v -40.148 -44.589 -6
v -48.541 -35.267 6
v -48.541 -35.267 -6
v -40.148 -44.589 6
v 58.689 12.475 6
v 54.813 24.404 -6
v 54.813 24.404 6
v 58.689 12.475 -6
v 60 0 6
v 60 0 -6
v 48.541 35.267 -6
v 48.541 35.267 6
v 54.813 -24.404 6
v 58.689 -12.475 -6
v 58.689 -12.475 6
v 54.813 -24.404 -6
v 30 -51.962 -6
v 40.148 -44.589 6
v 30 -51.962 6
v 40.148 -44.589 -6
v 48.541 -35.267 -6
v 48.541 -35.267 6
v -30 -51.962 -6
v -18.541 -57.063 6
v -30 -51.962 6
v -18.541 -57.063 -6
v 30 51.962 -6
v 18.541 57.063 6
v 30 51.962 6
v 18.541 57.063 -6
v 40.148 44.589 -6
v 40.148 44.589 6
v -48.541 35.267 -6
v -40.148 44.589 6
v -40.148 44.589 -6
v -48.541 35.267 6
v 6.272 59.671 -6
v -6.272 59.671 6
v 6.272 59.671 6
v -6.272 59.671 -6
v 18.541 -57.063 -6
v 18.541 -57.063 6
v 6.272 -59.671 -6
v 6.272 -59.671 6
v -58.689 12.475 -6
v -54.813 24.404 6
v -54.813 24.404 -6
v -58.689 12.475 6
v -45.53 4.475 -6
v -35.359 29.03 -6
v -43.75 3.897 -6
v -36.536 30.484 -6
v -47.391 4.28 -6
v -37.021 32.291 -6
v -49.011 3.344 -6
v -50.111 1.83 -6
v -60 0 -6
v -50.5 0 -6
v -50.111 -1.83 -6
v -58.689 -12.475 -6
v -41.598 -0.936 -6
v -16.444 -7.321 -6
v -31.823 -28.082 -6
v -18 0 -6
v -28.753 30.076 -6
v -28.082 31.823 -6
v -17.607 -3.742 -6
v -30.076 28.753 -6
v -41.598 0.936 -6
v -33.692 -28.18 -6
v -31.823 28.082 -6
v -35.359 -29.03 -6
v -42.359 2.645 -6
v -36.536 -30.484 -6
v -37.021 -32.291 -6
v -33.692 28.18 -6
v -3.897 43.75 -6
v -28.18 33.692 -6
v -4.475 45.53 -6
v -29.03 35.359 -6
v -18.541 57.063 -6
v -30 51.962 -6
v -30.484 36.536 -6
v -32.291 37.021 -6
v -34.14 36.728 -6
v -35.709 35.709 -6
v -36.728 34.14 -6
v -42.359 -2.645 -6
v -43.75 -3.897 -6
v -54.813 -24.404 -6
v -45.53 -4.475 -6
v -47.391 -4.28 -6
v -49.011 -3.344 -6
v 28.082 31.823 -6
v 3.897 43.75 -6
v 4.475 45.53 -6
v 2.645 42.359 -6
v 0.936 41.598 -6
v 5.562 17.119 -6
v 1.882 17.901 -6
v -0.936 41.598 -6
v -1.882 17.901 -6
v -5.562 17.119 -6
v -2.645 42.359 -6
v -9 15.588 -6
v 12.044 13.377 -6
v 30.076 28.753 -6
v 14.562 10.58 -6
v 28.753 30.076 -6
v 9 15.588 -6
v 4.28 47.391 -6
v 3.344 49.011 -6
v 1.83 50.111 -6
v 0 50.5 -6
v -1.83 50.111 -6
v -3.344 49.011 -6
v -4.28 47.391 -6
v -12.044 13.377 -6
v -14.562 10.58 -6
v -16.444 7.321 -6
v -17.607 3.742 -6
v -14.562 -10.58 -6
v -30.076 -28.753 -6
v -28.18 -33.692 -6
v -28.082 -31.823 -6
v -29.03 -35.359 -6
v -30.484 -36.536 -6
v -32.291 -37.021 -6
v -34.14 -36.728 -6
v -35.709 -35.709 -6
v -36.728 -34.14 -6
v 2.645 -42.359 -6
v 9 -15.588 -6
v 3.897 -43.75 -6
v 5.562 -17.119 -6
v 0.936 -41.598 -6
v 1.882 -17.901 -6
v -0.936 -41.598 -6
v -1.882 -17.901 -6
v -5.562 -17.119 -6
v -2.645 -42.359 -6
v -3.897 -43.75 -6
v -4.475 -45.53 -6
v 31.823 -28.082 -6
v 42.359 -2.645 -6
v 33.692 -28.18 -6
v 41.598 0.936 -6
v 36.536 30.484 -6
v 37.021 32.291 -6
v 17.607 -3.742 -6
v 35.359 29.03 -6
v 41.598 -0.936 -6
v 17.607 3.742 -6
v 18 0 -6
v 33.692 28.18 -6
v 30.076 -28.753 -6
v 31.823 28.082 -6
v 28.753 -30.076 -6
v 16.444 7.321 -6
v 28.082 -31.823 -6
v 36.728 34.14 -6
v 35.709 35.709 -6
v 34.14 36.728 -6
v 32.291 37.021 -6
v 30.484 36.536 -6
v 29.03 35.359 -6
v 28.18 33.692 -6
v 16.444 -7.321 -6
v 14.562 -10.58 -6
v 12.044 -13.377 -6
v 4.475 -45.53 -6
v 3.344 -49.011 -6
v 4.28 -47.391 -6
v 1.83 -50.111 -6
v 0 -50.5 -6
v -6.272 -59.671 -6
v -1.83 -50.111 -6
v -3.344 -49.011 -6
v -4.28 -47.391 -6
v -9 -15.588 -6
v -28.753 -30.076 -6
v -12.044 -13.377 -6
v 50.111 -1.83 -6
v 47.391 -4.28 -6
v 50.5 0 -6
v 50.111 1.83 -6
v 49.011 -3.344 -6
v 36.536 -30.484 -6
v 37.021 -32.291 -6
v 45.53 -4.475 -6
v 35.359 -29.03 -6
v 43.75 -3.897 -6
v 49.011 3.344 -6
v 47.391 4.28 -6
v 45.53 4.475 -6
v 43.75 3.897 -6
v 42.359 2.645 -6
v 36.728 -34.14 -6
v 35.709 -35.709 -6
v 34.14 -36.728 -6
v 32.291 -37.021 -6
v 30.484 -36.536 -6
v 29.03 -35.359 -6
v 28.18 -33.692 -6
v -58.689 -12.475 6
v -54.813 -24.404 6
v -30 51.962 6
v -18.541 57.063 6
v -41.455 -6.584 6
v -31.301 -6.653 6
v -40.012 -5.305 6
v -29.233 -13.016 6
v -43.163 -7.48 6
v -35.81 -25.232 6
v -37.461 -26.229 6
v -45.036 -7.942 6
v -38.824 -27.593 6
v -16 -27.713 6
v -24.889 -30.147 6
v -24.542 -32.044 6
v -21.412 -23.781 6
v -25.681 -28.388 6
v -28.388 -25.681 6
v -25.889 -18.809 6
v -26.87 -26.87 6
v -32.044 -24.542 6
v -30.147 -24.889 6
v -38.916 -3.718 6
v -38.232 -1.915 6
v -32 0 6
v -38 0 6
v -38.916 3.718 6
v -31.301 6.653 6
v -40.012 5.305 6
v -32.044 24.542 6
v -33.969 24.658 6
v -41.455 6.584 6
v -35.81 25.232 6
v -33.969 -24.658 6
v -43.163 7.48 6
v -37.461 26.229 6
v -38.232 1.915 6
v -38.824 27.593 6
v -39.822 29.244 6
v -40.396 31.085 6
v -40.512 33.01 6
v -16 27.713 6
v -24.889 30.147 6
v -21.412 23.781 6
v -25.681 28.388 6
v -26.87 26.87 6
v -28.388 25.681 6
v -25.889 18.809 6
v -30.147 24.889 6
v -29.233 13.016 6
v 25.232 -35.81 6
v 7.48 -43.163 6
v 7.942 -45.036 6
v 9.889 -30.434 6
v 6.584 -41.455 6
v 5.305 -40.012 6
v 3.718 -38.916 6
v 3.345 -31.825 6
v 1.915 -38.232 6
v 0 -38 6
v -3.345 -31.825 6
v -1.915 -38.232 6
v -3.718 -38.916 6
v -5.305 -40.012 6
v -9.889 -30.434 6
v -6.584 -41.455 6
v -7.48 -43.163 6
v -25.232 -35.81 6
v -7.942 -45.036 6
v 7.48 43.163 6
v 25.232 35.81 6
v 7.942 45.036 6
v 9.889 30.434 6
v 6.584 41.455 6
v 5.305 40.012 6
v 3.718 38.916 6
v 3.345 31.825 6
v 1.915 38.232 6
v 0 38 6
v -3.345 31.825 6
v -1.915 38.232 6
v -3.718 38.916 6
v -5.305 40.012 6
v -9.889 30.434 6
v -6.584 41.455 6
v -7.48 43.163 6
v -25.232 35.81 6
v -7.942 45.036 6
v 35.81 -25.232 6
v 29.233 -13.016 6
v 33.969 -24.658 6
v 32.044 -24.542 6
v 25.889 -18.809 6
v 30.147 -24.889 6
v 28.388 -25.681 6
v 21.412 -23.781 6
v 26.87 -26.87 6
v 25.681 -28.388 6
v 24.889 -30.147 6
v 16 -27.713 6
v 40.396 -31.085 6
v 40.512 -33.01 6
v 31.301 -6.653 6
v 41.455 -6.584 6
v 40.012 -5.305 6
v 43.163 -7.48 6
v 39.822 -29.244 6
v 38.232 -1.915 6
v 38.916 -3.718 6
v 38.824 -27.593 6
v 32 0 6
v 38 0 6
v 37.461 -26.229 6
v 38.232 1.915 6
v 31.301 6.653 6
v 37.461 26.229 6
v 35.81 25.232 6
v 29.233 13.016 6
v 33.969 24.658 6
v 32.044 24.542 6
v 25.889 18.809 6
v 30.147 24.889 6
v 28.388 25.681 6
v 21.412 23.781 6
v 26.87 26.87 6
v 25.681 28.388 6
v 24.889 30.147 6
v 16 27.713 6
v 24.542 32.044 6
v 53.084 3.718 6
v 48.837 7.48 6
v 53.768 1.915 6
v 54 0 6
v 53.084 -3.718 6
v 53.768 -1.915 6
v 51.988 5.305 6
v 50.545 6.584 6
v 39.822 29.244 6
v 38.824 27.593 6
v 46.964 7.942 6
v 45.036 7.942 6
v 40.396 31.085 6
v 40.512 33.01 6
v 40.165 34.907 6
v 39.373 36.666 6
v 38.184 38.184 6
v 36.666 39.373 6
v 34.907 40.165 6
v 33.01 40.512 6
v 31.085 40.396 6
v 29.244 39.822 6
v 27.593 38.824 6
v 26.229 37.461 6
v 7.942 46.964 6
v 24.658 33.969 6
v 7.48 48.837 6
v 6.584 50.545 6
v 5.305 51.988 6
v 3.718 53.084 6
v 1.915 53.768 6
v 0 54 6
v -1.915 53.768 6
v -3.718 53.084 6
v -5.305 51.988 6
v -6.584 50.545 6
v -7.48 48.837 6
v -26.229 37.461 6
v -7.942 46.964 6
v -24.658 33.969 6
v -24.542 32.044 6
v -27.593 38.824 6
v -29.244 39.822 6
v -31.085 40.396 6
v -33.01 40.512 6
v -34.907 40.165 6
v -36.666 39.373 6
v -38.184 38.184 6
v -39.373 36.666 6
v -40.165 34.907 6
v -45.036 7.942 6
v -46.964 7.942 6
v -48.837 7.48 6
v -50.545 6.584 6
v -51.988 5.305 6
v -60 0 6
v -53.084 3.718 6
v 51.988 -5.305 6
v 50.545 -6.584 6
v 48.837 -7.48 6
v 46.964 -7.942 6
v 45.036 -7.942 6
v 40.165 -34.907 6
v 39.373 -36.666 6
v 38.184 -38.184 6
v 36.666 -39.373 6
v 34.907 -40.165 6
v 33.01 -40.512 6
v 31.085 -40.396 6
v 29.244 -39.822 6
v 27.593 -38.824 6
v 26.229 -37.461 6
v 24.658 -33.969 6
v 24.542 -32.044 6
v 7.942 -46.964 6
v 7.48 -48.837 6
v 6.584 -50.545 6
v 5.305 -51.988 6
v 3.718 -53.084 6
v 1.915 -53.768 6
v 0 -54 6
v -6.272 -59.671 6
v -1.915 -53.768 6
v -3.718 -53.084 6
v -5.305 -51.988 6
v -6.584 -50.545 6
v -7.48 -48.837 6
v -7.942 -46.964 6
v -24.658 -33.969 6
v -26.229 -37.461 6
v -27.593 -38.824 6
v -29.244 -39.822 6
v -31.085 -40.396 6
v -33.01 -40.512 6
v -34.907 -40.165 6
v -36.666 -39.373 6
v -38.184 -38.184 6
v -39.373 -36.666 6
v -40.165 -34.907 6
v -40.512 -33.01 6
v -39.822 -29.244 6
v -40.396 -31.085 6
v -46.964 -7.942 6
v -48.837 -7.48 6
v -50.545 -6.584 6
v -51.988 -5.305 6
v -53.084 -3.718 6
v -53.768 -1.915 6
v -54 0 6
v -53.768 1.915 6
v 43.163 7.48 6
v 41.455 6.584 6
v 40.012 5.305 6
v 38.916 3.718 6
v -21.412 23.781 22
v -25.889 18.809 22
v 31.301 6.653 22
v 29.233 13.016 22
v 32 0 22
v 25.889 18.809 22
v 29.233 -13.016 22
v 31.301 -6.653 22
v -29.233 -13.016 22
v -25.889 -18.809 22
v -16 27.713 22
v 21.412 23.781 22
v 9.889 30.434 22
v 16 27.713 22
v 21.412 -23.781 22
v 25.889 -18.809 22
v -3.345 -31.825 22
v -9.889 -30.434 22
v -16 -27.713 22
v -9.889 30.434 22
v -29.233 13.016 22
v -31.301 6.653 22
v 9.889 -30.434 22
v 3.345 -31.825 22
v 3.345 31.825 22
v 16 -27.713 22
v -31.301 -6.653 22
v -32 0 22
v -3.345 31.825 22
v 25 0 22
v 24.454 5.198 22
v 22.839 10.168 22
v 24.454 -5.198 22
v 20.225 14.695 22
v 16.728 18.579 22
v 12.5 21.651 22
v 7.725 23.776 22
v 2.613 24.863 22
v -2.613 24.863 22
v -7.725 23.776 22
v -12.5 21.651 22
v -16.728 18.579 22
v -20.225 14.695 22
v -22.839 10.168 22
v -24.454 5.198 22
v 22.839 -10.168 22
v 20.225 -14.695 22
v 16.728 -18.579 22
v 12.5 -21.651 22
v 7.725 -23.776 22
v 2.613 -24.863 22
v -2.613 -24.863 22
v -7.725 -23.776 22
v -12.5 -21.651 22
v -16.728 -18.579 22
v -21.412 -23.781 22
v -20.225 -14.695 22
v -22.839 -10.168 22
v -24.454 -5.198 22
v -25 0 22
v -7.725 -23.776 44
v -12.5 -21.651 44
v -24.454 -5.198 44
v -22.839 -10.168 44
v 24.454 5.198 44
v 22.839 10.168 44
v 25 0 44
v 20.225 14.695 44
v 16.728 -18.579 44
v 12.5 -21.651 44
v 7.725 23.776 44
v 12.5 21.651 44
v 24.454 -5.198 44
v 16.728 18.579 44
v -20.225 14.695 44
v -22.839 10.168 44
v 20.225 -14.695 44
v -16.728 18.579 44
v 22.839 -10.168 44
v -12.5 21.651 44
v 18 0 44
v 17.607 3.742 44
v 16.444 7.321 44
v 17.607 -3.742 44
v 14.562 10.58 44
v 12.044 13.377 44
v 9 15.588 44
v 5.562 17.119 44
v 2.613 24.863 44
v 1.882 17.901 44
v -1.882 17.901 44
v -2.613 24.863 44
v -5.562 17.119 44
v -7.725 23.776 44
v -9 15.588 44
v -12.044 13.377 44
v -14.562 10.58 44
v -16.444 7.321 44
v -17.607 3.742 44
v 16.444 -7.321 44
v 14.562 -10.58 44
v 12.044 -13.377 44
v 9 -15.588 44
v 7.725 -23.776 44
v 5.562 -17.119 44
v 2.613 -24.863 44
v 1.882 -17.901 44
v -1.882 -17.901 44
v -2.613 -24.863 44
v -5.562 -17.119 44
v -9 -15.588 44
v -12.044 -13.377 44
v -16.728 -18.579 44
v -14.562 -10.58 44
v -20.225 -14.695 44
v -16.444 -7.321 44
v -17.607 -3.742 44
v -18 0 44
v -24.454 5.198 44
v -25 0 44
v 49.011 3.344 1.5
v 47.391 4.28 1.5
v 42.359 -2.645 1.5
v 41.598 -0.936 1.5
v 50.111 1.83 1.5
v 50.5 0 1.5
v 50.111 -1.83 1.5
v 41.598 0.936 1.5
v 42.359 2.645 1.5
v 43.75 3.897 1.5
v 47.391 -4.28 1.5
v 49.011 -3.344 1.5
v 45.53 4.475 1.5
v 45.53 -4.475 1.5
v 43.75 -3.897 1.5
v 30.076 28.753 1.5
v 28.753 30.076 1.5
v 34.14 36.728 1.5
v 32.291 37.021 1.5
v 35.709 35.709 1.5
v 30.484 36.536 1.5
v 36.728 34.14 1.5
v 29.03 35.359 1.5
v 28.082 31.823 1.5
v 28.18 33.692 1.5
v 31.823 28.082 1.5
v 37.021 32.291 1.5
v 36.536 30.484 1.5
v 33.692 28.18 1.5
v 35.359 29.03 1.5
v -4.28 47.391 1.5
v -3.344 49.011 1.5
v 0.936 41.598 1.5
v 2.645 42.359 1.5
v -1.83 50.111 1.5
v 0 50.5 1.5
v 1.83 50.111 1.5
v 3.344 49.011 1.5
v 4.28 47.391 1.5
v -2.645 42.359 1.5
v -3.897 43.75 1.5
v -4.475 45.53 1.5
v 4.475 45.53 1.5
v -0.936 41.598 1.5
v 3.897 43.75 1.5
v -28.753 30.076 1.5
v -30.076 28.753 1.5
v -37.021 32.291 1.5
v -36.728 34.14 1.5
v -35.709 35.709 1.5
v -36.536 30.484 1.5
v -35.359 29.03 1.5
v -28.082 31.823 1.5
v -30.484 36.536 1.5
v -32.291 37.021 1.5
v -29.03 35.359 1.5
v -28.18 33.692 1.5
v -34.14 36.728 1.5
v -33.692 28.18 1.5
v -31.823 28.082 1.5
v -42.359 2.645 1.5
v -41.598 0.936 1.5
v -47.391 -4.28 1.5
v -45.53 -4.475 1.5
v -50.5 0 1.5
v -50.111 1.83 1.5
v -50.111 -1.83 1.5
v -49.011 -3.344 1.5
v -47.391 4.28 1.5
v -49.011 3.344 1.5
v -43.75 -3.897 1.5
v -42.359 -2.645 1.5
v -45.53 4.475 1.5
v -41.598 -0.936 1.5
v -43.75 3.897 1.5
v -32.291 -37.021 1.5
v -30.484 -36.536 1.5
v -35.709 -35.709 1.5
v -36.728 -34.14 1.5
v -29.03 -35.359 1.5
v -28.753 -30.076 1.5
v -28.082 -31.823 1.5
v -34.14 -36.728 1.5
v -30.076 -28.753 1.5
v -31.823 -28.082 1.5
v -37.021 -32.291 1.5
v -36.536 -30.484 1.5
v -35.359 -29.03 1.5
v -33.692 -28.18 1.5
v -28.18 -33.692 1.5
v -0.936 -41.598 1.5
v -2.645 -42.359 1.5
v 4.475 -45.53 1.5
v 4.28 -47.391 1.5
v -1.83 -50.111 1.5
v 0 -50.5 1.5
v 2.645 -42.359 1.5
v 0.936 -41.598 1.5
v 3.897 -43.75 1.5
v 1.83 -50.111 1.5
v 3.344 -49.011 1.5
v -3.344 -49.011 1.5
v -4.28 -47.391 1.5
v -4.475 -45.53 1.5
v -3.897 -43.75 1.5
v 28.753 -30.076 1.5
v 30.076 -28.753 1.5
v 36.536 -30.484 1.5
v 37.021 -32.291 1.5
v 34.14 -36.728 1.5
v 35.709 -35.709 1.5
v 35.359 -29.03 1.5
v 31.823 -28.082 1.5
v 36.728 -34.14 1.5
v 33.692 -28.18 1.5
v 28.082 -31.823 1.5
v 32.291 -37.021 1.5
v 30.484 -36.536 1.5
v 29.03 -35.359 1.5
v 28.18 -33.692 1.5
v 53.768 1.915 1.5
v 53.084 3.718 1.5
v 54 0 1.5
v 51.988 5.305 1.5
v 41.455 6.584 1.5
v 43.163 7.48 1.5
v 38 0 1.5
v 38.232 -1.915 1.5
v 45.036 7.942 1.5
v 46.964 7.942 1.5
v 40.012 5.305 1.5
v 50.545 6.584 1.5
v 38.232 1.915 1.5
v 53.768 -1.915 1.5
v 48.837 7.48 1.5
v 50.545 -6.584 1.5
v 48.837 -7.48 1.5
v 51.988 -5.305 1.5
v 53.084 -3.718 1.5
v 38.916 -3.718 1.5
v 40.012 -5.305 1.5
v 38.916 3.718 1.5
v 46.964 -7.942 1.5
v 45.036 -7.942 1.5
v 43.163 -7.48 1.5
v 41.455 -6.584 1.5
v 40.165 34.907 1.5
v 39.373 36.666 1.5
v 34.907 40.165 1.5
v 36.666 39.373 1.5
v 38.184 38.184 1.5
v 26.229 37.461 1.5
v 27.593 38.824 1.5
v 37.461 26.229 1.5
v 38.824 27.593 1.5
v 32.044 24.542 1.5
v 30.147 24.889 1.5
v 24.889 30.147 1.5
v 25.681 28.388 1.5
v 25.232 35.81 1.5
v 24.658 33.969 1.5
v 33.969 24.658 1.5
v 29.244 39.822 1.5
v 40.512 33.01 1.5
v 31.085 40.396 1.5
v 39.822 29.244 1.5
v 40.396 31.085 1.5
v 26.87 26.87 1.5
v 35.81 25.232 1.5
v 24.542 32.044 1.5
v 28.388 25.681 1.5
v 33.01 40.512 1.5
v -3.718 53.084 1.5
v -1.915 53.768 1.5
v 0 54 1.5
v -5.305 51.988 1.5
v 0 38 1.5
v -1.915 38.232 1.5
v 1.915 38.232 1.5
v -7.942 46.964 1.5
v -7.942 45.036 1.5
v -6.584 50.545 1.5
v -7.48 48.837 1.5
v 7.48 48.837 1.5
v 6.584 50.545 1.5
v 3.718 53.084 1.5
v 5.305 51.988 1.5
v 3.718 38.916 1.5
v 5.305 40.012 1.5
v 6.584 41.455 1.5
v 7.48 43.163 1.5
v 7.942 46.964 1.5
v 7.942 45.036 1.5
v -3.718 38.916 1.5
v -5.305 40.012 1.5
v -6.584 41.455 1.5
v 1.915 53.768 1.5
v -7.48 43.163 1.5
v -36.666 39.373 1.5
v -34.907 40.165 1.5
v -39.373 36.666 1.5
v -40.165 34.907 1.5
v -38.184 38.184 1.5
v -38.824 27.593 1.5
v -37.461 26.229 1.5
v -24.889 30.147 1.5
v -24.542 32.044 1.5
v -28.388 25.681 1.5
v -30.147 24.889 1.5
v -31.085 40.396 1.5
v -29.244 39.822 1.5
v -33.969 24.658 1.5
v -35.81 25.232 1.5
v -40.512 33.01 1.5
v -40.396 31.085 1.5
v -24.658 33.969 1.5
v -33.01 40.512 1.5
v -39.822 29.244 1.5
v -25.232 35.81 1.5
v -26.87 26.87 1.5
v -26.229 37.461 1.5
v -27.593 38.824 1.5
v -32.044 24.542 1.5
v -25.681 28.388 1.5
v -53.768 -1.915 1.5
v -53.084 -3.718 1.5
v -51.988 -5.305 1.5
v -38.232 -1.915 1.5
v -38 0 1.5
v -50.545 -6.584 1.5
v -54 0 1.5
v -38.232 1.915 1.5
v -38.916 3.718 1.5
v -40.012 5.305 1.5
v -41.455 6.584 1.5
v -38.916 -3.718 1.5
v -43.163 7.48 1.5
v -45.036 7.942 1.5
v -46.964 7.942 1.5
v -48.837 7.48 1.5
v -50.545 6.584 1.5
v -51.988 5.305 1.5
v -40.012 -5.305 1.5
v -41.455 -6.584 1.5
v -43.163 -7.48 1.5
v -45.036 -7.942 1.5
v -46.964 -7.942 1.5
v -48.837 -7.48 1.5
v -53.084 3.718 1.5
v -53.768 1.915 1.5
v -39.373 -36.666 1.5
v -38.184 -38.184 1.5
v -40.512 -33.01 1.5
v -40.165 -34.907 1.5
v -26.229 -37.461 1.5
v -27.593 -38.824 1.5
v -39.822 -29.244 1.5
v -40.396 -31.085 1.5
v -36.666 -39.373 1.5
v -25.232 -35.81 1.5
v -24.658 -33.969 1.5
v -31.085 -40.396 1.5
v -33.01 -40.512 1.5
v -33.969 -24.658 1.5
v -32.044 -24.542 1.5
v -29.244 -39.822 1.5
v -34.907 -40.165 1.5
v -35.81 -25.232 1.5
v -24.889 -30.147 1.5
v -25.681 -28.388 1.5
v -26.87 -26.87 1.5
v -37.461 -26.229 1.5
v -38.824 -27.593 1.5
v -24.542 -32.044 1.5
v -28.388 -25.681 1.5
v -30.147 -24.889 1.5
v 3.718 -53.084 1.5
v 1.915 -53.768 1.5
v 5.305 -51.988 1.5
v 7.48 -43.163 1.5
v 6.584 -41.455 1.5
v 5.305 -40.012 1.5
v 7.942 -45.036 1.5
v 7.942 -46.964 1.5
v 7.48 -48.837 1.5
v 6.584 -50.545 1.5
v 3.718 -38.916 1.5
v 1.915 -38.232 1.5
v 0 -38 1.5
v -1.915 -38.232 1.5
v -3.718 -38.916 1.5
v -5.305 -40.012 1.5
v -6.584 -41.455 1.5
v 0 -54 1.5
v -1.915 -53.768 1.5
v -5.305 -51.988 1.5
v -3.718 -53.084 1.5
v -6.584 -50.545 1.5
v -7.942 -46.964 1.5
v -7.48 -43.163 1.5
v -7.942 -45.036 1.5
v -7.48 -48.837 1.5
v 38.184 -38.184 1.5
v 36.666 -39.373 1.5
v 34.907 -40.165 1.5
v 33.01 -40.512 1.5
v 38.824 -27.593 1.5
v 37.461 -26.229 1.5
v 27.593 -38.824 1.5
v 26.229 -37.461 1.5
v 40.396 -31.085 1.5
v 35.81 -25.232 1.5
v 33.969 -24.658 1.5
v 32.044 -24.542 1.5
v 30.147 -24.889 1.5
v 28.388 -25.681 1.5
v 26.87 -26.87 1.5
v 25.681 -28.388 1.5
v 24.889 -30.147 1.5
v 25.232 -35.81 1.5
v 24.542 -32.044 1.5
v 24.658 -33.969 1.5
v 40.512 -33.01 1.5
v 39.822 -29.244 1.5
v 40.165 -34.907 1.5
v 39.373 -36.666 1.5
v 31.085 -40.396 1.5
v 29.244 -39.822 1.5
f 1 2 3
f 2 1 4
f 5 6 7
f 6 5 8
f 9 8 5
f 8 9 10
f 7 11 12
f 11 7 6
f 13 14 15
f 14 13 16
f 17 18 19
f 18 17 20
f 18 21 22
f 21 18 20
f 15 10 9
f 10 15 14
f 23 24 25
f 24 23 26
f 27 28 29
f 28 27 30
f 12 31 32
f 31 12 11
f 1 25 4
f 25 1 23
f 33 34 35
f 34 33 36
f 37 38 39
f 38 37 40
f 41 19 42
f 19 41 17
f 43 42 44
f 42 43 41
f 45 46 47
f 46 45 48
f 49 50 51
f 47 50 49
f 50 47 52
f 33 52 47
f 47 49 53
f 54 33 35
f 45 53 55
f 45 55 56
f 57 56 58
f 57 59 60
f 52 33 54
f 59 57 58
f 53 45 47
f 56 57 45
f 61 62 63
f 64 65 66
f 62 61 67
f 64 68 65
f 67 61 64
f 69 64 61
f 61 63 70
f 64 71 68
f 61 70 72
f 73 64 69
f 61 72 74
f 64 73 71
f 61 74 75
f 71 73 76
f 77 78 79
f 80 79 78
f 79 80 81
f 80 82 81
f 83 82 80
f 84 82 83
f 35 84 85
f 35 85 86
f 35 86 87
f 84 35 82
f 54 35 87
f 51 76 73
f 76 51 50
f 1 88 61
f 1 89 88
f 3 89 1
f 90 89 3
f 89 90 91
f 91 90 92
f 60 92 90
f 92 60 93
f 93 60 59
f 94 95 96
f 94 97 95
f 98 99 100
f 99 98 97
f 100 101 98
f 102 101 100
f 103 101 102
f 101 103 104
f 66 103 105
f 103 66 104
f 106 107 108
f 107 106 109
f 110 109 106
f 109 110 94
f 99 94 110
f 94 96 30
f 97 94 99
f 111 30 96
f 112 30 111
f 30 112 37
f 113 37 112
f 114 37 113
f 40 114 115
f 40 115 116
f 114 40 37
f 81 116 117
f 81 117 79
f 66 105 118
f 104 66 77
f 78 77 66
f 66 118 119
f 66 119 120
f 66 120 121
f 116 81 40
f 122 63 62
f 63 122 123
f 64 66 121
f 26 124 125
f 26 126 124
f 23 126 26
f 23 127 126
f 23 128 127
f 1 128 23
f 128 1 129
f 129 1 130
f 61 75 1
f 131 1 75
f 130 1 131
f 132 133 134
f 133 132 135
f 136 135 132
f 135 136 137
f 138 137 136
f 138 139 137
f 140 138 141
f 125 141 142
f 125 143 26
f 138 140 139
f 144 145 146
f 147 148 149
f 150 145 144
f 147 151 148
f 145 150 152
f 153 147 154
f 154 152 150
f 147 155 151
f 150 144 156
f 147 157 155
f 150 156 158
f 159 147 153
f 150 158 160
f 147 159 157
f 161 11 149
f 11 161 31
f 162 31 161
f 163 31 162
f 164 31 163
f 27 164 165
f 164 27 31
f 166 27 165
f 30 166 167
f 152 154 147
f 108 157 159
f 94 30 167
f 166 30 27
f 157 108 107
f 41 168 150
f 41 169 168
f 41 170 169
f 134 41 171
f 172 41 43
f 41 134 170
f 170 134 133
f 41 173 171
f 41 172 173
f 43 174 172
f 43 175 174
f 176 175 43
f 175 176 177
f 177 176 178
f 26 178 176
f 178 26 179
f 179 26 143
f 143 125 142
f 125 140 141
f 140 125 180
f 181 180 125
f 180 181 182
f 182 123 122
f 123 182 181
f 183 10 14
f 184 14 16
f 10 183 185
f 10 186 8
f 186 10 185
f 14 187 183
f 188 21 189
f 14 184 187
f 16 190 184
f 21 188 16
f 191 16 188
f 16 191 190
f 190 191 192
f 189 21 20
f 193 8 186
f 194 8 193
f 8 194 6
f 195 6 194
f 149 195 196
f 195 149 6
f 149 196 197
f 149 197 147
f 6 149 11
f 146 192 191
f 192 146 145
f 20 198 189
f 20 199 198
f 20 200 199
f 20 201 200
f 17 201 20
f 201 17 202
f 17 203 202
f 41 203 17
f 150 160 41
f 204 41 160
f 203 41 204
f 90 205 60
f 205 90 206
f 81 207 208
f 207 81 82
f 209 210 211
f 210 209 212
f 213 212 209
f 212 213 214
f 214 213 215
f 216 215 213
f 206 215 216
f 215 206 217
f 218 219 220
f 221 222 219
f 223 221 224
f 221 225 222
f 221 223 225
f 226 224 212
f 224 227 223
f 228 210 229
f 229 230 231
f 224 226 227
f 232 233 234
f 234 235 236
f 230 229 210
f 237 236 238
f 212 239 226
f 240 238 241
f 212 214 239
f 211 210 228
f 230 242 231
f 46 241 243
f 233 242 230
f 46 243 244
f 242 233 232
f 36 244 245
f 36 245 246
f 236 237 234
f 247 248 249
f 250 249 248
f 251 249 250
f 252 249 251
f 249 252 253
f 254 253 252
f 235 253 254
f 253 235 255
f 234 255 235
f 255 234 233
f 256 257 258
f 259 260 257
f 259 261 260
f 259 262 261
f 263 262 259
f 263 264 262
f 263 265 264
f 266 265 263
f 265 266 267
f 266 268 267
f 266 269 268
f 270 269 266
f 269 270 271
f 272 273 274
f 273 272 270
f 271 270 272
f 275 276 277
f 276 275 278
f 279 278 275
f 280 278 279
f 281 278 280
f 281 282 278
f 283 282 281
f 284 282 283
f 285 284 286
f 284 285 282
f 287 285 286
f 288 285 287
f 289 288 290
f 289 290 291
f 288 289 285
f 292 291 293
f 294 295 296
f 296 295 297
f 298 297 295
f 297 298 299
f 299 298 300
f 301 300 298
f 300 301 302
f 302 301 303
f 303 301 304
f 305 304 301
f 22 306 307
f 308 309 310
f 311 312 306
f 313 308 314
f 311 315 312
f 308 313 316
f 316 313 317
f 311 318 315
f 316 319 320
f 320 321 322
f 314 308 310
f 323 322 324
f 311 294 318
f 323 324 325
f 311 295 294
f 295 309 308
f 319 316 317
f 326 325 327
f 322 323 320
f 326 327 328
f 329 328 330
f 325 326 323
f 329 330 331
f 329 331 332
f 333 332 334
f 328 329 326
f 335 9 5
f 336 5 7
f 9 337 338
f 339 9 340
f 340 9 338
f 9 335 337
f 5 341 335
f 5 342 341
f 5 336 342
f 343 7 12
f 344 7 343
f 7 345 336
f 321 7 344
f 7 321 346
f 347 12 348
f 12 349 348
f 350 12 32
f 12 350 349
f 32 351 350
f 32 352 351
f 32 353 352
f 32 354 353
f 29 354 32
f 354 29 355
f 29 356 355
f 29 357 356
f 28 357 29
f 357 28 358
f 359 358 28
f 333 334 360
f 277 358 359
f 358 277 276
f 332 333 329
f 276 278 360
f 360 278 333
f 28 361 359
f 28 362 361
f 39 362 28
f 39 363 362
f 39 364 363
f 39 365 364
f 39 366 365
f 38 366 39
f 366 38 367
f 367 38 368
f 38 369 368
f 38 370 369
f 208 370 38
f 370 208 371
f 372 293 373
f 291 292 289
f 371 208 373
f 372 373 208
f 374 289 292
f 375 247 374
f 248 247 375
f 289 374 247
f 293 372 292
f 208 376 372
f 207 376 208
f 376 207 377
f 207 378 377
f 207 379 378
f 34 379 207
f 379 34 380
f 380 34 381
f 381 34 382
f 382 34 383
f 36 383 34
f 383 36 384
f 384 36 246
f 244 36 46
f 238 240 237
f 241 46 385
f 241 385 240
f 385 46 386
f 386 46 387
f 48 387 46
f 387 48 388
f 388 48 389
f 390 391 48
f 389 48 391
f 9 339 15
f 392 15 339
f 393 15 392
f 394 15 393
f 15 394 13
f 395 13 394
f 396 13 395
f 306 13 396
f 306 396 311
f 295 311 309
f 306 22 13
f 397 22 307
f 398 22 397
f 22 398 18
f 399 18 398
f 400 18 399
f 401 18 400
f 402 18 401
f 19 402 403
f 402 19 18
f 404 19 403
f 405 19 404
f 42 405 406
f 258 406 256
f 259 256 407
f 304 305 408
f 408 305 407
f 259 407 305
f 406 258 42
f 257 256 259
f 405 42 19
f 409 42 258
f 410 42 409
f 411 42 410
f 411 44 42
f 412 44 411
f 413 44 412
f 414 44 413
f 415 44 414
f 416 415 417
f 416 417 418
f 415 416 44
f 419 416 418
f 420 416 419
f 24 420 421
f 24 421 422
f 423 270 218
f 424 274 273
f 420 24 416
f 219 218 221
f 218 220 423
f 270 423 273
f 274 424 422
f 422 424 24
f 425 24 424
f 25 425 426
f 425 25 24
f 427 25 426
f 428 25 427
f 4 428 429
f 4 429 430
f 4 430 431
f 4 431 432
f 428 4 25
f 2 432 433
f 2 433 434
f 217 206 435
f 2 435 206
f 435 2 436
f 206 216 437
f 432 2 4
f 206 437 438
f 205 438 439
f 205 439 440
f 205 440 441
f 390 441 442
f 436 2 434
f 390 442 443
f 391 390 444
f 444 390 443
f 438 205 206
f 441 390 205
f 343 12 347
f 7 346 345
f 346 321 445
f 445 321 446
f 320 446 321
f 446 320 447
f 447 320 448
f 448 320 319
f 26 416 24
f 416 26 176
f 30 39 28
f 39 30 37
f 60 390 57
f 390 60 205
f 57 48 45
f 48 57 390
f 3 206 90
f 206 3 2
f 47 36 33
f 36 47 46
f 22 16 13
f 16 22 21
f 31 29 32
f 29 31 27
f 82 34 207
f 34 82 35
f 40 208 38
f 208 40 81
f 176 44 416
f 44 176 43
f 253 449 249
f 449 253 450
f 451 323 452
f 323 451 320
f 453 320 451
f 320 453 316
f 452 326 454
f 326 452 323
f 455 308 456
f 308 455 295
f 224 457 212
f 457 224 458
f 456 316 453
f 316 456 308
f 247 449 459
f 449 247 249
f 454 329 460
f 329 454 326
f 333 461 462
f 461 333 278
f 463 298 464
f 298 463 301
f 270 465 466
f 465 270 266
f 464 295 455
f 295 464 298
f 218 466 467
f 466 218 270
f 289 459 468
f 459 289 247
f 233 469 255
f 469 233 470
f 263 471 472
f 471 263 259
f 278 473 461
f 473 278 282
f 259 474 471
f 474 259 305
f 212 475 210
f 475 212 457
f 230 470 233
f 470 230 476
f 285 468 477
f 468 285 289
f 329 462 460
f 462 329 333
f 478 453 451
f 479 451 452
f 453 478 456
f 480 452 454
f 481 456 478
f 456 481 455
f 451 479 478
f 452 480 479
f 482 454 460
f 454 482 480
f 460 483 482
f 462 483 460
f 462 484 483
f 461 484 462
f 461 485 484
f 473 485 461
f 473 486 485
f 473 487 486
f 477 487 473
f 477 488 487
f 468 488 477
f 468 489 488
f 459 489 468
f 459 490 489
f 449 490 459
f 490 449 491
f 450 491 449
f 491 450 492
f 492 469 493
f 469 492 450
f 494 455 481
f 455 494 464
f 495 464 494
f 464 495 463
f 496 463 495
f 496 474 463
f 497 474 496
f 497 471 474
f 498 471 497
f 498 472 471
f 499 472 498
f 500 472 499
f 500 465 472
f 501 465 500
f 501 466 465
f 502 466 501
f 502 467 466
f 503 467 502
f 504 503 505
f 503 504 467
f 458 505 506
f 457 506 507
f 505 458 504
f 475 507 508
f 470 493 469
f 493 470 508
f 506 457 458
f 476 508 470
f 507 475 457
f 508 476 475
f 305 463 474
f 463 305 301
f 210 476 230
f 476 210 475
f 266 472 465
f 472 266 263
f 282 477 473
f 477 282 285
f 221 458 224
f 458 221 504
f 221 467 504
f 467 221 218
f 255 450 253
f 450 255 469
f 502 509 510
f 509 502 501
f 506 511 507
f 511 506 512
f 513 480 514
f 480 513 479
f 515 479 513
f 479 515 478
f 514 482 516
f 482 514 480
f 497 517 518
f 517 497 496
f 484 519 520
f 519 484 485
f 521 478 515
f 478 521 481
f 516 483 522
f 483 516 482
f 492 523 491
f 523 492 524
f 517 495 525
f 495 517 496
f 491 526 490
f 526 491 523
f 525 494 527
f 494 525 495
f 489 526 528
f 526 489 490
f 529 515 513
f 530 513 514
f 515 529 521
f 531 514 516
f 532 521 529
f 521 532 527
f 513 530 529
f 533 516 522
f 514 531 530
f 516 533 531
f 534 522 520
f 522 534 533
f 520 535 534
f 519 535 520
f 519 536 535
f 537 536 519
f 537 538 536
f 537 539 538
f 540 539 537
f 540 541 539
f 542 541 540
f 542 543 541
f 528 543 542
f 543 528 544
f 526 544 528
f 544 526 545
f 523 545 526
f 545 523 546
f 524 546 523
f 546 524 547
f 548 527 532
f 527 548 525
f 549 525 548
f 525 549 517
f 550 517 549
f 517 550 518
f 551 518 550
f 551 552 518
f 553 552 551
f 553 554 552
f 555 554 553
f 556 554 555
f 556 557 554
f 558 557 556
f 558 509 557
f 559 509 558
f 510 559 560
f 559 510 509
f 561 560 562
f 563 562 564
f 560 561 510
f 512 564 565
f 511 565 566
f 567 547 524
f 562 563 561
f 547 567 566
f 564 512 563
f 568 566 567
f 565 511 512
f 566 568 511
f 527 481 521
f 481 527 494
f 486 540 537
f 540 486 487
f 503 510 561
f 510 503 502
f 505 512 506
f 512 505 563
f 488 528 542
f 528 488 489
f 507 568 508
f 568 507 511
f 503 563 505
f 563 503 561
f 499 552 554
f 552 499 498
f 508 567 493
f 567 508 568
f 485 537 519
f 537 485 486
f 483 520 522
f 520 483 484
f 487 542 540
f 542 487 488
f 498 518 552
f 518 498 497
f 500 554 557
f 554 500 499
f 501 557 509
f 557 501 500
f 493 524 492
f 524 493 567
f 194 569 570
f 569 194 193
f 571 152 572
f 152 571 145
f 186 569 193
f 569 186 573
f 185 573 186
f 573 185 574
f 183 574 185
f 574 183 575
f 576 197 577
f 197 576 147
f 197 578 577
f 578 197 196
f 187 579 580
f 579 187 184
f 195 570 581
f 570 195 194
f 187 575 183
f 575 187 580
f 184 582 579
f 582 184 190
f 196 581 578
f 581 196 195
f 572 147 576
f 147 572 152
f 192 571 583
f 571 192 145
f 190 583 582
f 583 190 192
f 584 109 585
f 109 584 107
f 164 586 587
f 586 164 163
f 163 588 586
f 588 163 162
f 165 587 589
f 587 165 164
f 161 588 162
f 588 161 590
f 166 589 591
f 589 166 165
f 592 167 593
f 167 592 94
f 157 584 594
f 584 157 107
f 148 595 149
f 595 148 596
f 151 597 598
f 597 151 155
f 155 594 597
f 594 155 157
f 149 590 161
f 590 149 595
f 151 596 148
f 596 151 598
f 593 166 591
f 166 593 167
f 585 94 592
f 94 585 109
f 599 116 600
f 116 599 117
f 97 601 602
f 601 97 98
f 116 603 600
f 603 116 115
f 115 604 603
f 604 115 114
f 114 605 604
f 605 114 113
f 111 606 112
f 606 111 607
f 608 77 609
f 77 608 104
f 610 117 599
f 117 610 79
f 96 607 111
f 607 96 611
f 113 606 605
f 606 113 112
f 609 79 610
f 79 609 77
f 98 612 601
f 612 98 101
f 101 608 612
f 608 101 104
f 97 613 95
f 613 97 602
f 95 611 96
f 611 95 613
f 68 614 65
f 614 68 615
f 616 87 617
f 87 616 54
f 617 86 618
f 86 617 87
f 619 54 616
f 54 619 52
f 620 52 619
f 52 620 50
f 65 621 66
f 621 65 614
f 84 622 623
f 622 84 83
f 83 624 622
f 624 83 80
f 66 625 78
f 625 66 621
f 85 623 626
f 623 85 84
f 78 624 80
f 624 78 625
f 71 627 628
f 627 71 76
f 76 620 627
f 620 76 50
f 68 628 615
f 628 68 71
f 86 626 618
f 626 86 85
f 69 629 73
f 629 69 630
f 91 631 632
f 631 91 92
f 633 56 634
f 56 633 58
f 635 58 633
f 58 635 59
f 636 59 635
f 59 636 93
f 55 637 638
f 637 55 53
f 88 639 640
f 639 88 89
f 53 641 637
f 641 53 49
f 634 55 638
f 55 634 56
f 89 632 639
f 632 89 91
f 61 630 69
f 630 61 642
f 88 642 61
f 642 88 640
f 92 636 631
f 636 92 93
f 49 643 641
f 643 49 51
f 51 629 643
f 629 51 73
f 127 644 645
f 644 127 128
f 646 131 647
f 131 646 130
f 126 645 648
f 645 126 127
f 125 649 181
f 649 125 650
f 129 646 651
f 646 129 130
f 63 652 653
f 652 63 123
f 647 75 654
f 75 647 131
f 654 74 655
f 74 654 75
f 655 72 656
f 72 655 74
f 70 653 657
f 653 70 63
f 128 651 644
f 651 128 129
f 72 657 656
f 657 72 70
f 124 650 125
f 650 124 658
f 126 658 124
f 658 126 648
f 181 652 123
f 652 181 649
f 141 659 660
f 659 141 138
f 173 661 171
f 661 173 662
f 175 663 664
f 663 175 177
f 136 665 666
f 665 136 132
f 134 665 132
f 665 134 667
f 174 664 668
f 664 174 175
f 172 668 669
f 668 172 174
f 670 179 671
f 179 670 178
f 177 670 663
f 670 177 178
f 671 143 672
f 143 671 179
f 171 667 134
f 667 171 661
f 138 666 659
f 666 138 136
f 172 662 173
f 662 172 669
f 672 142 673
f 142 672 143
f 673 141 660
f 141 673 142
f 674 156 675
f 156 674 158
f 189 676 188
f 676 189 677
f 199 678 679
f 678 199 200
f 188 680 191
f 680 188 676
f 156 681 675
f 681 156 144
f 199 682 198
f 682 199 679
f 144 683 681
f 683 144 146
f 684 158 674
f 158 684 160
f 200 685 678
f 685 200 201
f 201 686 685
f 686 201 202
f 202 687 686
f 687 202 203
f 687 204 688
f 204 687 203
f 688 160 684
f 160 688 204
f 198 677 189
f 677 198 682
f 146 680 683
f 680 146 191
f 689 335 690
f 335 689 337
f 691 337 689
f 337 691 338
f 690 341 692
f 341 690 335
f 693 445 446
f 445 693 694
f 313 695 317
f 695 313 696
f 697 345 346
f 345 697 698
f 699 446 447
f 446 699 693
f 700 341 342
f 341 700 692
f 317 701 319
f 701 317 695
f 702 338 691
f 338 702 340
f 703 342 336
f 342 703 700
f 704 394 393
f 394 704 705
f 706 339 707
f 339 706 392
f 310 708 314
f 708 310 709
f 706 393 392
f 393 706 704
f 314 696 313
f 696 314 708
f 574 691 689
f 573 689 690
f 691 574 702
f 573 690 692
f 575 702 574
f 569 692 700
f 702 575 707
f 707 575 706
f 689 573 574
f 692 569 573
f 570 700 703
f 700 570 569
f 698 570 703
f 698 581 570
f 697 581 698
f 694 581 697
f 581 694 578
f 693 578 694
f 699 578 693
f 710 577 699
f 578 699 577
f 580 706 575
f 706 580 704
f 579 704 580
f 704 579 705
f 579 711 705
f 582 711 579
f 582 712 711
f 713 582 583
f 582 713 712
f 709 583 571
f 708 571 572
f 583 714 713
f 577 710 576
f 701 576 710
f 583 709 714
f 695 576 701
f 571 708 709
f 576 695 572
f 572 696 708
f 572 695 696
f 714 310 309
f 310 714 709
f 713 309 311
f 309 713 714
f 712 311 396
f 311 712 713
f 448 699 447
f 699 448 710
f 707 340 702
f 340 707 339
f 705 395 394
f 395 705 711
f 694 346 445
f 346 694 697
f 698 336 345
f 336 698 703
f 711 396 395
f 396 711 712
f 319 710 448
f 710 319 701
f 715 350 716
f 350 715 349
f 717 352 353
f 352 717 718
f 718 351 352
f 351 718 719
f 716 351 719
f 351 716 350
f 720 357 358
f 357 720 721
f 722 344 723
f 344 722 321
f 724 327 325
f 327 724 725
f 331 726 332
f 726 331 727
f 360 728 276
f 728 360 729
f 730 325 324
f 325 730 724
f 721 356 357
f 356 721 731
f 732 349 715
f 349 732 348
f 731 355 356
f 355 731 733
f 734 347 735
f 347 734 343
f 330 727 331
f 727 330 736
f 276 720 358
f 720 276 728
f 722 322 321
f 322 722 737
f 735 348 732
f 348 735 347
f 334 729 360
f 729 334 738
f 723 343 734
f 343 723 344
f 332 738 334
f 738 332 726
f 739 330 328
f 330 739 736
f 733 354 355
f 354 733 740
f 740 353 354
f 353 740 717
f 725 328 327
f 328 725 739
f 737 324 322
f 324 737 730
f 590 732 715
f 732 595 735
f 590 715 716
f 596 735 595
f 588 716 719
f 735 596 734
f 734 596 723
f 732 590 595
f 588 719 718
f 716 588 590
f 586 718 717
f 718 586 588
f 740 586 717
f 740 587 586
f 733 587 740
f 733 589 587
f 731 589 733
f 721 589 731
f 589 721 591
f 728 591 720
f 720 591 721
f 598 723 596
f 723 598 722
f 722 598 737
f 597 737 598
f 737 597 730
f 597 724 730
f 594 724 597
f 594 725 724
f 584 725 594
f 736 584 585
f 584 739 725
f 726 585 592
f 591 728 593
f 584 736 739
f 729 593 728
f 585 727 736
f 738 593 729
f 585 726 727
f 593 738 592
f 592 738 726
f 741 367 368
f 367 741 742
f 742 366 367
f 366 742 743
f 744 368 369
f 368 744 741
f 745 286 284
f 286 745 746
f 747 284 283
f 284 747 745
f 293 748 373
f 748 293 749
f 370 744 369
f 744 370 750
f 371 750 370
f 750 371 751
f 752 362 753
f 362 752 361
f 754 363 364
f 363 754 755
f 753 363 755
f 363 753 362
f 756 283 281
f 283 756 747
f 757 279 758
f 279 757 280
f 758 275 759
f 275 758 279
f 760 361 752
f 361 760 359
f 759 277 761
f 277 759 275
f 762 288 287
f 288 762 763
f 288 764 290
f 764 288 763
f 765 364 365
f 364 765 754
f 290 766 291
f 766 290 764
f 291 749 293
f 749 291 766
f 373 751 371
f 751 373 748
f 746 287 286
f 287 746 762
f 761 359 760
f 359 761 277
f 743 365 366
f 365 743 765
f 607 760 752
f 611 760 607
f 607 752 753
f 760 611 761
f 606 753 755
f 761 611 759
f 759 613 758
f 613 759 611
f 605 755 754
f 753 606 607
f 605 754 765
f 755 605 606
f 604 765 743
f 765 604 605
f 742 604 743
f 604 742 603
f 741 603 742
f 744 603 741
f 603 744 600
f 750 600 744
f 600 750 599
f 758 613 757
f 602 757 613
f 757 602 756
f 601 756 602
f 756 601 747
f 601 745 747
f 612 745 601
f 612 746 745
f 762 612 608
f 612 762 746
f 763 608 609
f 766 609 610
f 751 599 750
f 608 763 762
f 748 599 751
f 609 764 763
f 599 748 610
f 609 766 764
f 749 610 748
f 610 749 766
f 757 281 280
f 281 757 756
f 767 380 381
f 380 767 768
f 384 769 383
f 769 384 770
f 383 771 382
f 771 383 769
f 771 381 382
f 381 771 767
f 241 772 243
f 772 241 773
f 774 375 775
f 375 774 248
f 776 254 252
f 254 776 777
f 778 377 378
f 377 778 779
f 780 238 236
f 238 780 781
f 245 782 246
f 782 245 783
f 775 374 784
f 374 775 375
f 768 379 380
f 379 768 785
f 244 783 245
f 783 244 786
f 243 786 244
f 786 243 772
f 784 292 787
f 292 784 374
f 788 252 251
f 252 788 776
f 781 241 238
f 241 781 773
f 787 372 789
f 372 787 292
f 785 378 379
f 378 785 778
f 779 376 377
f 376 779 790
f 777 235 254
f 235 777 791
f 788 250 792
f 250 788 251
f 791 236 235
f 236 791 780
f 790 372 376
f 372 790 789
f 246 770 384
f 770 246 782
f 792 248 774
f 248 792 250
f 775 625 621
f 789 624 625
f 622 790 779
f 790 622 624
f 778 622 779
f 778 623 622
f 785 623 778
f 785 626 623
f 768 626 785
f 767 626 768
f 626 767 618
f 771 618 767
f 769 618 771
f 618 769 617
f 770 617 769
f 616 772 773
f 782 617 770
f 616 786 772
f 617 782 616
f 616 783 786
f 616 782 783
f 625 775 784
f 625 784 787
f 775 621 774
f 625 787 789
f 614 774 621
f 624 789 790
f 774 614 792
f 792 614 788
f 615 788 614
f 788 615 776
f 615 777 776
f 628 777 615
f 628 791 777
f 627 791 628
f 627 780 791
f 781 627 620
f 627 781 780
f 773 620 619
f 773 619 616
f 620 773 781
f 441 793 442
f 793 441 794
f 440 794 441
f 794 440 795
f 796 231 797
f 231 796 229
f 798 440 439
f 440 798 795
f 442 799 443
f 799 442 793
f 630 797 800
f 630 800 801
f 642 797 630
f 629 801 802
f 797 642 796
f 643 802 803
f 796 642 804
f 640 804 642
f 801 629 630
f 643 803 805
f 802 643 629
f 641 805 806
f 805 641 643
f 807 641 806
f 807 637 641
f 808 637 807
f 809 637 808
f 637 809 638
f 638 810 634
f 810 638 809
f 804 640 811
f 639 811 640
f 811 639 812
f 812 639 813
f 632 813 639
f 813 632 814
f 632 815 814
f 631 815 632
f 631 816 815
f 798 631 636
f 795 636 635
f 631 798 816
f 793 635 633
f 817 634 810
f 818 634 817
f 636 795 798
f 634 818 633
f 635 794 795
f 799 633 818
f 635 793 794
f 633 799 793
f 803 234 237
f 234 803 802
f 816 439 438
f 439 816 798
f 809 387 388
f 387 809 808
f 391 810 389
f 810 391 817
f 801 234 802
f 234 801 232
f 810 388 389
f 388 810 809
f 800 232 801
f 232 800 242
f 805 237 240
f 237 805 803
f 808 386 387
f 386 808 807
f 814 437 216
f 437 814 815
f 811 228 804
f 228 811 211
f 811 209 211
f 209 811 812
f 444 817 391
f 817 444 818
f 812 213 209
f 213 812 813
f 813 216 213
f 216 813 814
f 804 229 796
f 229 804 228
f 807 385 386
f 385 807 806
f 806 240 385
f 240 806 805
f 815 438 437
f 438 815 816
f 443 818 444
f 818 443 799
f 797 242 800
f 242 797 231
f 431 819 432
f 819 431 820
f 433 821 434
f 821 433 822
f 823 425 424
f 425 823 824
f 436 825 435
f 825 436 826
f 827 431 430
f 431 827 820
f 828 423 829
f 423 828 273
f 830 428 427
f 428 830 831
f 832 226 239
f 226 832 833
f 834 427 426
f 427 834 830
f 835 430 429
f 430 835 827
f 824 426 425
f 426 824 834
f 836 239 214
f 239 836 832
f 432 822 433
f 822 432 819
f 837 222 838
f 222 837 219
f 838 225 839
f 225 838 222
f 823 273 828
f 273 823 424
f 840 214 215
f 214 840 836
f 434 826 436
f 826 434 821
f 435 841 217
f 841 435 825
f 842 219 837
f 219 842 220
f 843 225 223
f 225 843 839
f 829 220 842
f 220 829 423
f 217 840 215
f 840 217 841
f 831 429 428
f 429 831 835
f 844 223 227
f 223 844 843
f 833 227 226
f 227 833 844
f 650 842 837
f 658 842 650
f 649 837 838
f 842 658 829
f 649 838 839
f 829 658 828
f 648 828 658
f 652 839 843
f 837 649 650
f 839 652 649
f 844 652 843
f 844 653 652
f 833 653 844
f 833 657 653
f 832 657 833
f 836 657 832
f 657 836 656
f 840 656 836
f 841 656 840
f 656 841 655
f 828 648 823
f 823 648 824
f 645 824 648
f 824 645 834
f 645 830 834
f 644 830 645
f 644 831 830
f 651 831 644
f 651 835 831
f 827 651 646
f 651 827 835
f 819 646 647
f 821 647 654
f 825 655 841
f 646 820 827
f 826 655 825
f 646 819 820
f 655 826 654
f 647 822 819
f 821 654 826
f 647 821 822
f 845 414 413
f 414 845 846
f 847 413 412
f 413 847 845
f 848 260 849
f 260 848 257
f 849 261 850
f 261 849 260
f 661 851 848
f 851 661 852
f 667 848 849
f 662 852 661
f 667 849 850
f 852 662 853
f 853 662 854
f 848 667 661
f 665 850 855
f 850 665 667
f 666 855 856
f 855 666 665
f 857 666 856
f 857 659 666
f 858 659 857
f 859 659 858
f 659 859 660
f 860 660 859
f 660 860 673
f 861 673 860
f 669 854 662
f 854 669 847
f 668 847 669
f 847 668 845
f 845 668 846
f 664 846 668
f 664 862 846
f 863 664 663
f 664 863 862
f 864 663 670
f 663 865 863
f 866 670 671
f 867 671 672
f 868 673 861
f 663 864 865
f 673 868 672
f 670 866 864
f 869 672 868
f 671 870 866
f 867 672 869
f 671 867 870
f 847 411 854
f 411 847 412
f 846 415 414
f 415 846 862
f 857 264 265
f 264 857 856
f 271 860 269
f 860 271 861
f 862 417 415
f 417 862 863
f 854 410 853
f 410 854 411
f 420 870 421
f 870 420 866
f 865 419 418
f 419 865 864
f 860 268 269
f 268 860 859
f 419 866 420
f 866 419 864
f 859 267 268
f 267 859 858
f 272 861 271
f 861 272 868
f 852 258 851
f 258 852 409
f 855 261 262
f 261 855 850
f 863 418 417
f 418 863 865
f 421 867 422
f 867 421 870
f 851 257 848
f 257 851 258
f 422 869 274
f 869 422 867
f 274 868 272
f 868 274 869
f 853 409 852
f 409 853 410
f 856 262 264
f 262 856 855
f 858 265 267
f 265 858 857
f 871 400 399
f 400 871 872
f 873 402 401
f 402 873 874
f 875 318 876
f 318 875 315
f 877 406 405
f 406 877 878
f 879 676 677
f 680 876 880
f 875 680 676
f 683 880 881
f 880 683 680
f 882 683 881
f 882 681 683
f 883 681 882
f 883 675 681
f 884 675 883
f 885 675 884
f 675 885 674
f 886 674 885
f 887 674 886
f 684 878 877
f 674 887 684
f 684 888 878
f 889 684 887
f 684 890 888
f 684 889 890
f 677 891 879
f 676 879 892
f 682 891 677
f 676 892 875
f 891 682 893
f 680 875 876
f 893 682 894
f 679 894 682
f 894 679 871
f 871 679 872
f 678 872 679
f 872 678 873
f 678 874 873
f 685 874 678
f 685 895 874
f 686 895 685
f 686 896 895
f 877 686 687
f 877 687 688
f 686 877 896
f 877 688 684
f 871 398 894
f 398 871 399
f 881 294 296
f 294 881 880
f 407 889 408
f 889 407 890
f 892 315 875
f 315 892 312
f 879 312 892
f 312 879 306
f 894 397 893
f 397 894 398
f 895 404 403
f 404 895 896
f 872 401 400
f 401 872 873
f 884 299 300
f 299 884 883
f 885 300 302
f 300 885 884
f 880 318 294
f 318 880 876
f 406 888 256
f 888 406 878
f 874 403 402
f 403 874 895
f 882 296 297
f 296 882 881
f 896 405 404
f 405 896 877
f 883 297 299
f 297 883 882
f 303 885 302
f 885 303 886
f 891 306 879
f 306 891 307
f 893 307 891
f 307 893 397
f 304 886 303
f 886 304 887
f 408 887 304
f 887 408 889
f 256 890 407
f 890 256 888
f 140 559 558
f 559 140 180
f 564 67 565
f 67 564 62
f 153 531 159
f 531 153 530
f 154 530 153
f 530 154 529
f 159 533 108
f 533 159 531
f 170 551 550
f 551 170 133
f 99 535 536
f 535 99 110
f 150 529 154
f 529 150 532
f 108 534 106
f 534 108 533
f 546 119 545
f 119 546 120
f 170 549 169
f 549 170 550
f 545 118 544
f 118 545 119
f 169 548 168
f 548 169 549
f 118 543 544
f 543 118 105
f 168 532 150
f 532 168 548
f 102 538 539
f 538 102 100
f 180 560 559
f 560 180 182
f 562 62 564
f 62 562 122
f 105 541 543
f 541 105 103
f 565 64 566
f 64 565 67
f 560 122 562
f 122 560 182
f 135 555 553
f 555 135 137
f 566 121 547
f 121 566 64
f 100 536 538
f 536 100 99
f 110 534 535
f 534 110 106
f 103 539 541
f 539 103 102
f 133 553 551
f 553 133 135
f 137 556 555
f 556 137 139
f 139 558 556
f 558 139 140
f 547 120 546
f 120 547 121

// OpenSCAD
// Flanged pipe connector with counterbored bolt holes

flange_outer_r = 60;
flange_h = 12;
pipe_outer_r = 25;
pipe_inner_r = 18;
pipe_h = 38;
neck_r = 32;
neck_h = 16;
bolt_circle_r = 46;
bolt_hole_r = 4.5;
bolt_counter_r = 8;
bolt_counter_h = 4;

module through_hole(r = 4.5) {
    cylinder(h=80, r=r, center=true);
}

module counterbore(r = 8) {
    translate([0, 0, flange_h / 2 - bolt_counter_h / 2]) {
        cylinder(h=bolt_counter_h + 1, r=r, center=true);
    }
}

difference() {
    union() {
        cylinder(h=flange_h, r=flange_outer_r, center=true);
        translate([0, 0, flange_h / 2 + neck_h / 2]) {
            cylinder(h=neck_h, r=neck_r, center=true);
        }
        translate([0, 0, flange_h / 2 + pipe_h / 2]) {
            cylinder(h=pipe_h, r=pipe_outer_r, center=true);
        }
    }
    cylinder(h=120, r=pipe_inner_r, center=true);
    for (i = [0 : 7]) {
        rotate([0, 0, i * 45]) {
            translate([bolt_circle_r, 0, 0]) {
                through_hole(r=bolt_hole_r);
            }
        }
    }
    for (i = [0 : 7]) {
        rotate([0, 0, i * 45]) {
            translate([bolt_circle_r, 0, 0]) {
                counterbore(r=bolt_counter_r);
            }
        }
    }
}
